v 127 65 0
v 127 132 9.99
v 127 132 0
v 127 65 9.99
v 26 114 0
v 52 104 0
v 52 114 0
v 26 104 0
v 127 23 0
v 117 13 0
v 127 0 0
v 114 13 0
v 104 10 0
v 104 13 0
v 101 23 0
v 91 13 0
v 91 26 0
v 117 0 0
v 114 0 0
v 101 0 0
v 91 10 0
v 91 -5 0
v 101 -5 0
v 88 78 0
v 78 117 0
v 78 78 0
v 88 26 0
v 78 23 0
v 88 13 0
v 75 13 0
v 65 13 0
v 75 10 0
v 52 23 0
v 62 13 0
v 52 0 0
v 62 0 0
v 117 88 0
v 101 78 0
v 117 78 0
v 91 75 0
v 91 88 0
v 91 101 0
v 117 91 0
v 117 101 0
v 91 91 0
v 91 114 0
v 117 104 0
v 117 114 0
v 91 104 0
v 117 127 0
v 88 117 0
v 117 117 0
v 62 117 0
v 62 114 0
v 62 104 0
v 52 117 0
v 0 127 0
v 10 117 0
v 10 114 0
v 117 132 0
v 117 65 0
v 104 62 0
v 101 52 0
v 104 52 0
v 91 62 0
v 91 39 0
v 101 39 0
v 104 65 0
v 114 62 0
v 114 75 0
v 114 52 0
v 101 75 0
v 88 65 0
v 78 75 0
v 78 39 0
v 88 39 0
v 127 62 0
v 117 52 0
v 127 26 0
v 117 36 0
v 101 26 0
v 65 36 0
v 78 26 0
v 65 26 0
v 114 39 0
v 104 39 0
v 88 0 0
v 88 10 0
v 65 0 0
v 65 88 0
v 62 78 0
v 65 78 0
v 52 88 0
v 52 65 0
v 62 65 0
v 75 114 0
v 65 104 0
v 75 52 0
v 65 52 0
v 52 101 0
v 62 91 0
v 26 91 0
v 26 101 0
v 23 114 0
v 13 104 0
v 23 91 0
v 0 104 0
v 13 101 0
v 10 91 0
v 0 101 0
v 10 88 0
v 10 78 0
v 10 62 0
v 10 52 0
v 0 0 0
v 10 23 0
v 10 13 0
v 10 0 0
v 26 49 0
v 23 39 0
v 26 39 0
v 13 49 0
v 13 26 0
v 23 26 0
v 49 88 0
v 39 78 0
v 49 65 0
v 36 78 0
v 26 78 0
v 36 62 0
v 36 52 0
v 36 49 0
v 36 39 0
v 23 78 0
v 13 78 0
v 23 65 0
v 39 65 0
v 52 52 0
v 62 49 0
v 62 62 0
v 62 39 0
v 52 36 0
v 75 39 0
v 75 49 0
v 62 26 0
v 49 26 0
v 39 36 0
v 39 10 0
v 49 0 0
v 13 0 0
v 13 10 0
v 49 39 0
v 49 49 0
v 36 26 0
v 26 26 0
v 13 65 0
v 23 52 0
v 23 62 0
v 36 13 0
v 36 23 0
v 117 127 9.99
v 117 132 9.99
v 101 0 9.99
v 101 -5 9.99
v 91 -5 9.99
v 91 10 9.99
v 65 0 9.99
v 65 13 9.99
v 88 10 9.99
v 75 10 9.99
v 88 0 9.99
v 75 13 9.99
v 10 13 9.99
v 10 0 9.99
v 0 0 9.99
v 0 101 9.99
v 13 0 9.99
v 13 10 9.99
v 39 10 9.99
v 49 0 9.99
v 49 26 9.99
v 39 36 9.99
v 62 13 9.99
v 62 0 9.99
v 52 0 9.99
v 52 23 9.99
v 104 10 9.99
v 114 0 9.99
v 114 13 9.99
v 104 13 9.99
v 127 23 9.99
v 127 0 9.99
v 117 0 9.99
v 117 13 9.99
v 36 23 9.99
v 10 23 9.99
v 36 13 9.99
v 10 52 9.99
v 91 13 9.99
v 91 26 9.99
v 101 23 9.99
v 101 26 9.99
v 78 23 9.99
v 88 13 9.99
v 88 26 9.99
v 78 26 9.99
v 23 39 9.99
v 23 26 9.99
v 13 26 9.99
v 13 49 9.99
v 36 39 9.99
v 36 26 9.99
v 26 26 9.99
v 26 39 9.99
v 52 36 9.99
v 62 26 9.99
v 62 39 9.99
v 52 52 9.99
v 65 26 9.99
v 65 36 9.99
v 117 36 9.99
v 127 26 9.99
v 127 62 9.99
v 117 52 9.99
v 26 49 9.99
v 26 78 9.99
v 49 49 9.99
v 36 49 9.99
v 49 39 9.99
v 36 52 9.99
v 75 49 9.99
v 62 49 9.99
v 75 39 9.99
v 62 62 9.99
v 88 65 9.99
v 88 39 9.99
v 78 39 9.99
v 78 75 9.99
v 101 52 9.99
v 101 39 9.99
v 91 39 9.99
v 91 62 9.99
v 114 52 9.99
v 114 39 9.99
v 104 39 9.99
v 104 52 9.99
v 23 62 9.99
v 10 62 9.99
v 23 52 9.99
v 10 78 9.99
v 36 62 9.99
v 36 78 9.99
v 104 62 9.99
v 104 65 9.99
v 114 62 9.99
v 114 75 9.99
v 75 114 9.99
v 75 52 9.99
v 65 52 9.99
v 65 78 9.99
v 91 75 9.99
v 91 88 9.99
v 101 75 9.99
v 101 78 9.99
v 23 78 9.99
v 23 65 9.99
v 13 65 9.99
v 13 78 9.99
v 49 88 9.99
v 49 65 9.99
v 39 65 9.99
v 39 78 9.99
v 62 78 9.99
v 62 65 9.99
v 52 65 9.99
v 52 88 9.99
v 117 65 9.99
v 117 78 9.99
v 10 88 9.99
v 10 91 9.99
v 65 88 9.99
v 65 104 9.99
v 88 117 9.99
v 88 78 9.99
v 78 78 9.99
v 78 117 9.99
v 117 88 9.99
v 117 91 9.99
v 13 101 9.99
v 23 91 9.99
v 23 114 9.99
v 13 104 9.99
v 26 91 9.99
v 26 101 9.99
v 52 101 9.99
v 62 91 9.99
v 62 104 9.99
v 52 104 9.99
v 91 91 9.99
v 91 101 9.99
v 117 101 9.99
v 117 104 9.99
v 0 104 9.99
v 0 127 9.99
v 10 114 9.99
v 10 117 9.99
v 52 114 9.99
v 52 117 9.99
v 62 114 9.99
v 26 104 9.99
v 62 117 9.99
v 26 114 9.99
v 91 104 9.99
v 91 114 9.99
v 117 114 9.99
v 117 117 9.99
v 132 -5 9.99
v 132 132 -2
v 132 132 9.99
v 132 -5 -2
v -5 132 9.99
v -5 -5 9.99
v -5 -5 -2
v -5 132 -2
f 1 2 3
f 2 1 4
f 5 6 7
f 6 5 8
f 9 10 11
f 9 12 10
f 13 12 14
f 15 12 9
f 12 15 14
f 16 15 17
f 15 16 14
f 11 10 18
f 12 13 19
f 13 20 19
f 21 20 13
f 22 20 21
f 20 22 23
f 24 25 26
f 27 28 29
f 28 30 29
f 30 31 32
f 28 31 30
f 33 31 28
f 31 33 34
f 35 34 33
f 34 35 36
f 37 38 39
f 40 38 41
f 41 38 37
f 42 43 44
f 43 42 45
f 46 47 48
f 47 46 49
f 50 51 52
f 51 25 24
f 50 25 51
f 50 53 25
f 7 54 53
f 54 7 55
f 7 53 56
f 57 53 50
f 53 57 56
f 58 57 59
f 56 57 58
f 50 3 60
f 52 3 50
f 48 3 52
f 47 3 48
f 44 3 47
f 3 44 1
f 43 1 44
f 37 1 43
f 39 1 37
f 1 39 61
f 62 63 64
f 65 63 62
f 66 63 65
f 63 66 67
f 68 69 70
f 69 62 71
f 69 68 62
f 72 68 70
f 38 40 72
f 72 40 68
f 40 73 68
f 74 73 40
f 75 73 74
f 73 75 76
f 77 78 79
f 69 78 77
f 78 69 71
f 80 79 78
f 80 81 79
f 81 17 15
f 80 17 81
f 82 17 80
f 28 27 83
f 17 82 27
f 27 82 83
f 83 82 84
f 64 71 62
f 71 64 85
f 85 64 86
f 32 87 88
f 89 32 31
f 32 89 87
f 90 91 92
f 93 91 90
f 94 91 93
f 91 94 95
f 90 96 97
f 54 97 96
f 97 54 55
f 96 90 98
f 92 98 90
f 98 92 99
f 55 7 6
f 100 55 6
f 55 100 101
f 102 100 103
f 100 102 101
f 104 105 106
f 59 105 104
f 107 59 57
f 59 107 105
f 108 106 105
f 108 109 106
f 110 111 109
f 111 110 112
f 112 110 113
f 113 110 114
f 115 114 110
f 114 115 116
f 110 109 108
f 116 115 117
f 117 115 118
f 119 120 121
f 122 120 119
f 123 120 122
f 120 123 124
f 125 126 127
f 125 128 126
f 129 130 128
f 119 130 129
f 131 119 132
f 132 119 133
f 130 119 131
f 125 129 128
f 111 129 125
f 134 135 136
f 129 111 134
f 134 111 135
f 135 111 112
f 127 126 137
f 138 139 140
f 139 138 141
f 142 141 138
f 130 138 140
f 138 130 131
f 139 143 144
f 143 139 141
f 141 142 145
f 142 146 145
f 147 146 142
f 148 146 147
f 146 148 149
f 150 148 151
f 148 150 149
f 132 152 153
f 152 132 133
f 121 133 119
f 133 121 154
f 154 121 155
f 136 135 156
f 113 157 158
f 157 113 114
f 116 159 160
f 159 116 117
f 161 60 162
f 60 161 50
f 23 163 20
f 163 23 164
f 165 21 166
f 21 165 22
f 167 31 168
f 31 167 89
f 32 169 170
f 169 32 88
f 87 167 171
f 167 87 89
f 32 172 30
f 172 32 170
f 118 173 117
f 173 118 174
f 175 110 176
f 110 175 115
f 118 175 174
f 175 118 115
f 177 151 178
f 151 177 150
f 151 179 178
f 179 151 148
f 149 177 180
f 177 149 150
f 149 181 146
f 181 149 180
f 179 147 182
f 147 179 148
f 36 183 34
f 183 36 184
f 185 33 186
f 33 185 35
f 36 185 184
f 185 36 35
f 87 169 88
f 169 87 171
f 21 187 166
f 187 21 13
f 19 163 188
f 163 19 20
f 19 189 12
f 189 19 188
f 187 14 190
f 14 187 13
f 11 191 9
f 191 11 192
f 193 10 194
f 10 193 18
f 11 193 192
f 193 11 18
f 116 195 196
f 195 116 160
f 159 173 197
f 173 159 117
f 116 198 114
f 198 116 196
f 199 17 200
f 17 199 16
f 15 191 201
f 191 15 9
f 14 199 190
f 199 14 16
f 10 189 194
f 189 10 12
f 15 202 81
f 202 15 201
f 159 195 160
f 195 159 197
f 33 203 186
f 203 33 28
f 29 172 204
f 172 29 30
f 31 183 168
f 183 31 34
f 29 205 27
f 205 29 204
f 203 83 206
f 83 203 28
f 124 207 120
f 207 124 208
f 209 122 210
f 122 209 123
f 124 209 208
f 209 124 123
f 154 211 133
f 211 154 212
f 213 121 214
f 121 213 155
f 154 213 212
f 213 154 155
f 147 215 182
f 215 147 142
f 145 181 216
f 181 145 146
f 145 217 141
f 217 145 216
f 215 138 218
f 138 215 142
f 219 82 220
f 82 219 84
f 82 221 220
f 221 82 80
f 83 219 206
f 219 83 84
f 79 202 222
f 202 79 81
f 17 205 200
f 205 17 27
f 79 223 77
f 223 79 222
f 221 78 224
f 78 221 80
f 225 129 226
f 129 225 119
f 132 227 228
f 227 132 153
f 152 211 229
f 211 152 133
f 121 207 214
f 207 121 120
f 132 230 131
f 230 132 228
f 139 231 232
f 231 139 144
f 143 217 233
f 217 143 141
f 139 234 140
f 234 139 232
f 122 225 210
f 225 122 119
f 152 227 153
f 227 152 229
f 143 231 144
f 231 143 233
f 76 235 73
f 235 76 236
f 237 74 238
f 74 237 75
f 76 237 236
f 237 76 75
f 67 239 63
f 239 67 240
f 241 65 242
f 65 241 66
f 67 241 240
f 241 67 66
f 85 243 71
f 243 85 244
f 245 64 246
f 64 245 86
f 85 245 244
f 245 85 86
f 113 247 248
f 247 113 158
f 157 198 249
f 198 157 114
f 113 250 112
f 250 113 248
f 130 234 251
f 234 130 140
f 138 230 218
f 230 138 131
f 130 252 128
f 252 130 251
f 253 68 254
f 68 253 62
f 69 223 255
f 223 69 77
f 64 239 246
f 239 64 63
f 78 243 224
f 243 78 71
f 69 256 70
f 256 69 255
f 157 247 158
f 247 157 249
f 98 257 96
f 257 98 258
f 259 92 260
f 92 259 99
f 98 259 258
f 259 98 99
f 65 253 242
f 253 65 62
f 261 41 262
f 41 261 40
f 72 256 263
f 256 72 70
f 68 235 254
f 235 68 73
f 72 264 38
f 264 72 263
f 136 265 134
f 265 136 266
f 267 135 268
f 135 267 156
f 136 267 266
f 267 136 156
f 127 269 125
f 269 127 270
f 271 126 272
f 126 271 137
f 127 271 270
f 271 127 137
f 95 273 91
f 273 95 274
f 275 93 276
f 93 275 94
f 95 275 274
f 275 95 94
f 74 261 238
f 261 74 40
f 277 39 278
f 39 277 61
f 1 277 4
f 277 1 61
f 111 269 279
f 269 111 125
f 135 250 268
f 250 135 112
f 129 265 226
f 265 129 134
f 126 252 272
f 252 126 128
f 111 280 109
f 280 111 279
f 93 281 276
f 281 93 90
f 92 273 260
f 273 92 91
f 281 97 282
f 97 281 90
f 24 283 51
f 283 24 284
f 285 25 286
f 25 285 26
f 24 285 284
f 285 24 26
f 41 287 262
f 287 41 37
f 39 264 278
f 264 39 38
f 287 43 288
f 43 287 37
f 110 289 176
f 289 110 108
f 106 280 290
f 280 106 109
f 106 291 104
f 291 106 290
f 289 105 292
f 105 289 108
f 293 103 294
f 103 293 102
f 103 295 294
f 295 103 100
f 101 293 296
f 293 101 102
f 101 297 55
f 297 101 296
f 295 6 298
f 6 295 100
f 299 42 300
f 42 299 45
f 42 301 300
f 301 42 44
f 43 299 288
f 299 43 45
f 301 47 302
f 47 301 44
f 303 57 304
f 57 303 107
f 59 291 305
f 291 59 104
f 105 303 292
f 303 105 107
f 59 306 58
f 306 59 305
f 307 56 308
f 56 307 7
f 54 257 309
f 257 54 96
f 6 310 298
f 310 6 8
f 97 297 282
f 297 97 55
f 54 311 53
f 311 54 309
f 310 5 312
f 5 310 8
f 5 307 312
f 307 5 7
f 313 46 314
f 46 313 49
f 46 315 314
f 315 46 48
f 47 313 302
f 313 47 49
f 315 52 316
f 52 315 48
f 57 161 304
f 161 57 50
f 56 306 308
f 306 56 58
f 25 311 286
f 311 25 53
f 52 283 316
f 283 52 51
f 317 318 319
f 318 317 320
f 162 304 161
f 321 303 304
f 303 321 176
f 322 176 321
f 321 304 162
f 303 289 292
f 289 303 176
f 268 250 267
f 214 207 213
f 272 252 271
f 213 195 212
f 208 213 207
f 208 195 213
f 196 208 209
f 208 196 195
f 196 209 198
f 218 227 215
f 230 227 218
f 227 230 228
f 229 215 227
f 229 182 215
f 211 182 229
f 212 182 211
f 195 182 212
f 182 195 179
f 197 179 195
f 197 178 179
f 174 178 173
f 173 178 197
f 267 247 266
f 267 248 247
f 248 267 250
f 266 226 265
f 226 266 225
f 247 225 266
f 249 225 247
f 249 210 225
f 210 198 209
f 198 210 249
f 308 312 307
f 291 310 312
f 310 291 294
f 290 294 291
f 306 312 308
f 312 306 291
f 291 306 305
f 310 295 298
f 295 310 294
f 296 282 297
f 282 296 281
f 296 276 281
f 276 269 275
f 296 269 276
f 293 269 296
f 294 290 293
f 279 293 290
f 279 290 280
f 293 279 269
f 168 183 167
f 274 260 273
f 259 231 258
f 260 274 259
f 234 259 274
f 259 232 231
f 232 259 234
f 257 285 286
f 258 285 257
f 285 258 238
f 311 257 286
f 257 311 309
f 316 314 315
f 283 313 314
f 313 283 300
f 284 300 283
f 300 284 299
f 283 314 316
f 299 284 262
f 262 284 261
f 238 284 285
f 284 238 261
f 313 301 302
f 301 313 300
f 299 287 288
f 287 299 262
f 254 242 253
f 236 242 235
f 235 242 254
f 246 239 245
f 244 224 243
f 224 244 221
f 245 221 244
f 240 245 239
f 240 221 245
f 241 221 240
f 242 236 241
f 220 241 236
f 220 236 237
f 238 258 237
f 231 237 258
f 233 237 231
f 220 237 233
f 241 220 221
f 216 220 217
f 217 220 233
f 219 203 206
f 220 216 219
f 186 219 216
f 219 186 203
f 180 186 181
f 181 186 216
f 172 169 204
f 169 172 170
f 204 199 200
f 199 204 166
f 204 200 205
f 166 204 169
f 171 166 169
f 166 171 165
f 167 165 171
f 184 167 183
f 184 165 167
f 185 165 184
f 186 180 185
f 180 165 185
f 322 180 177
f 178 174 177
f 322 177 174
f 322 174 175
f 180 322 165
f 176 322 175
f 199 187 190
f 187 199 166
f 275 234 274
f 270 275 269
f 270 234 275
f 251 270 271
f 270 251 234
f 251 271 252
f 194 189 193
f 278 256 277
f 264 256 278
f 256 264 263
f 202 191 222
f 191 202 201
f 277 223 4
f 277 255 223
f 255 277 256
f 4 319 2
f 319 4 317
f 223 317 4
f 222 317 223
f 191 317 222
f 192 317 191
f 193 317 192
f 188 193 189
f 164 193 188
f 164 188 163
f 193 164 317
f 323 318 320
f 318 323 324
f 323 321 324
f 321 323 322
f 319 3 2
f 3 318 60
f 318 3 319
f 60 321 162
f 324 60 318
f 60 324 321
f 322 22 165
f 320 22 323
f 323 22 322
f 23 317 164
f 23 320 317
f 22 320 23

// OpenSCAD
//Algorithms learned from the excellent explanations at http://weblog.jamisbuck.org/2011/2/7/maze-generation-algorithm-recap.html

//preview[view:south, tilt:top]

//See instructions if increasing this doesn't work (this shouldn't be a problem below 25)
maze_width=10;//[4:50]


//See instructions if increasing this doesn't work
maze_height=10;//[4:50]


//See instructions for information on maze types
maze_type = "Sidewinder";//[Sidewinder,Binary Tree,Unicursal Sidewinder,Unicursal Binary Tree]

//Lower numbers cause more vertical paths. Higher numbers cause more horizontal paths.
direction_bias = 5;//[1:9]

//How wide should each path be, in mm
width_of_paths=10;//[1:50]


//Height, in mm, of the walls
wall_height=10;//[5:50]


//Thickness of inside walls, in mm
inside_wall_thickness=3;//[1:10]


//Thickness of outside wall, in mm
outside_wall_thickness=5;//[1:20]

//Allows entry into the maze from the side
include_an_entrance=1;//[0:No,1:Yes]

//Thickness of base below maze, in mm
base_thickness=2;//[1:10]


//See instructions for information on this, otherwise, leave at 0
random_seed = 0;

/* [Hidden] */
bias = (direction_bias < 5)? 5/direction_bias : .2*(10-direction_bias);

seed = (random_seed == 0)?rands(0,1000000,1)[0]:random_seed;
width=unicursalchecker()?(maze_width%2==0)?maze_width/2:(maze_width+1)/2:maze_width;
height=unicursalchecker()?(maze_height%2==0)?maze_height/2:(maze_height+1)/2:maze_height;
path_width=unicursalchecker()?(width_of_paths*2)+inside_wall_thickness:width_of_paths;

    
    difference(){
      mazeBase();//Correctly sized cube
      if(include_an_entrance == 1)  
        mazeEntrance();//More cubes
   if(maze_type == "Sidewinder" || maze_type == "Unicursal Sidewinder")      
        SideWinder();
   if(maze_type == "Binary Tree"||maze_type == "Unicursal Binary Tree")
       BinaryTree();
     }
    if(maze_type == "Unicursal Sidewinder") SideWinder(unicursal = true);//Adds mid-paths for unicursal mazes
    if(maze_type == "Unicursal Binary Tree") BinaryTree(unicursal = true);
function unicursalchecker()=(maze_type == "Unicursal Sidewinder" || maze_type == "Unicursal Binary Tree");
    
module mazeEntrance(){
    
        translate([(path_width*(width-1))+(inside_wall_thickness*(width-1)),(path_width*height)+(inside_wall_thickness*(height-1))-.1,0])cube([path_width,outside_wall_thickness+.2,wall_height+.1]);//Top right entrance
    if(!unicursalchecker()){//Other entrance
        nums = (width%2==0)?(width%4==0)?width/2:(width+2)/2:((width-1)%4==0)?(width+1)/2:(width-1)/2;
        pos=floor(rands(((width-nums)/2),width-((width-nums)/2),1,seed)[0]);
        translate([(path_width*pos)+(inside_wall_thickness*pos),-(outside_wall_thickness+.1),0])cube([path_width,outside_wall_thickness+.2,wall_height+.1]);
    }
}  
    
module mazeBase(){
    
    translate([-outside_wall_thickness,-outside_wall_thickness,-base_thickness])cube([(2*outside_wall_thickness)+(width*path_width)+((width-1)*inside_wall_thickness),(2*outside_wall_thickness)+(height*path_width)+((height-1)*inside_wall_thickness),base_thickness+wall_height-.01]);    
    }
    
module BinaryTree(unicursal=false){
rndtmp=biasfixer(rndtmpgenbias());//generates array of rands

rndflr = rndflrer(rndtmp);//makes array 0 or 1
    
rndrow = rndrower(rndflr);//creates correctly size row
    
mazetopremoved = remove_top_row(rndrow);
//Required for binary tree    
mazeinfo = remove_right_row(mazetopremoved);

    //Generates parts
for(h=[0:height-1])for(w=[0:width-1])
    translate([(path_width+inside_wall_thickness)*w,(path_width+inside_wall_thickness)*h,0])BinaryTreeblock(mazeinfo[h][w]);

function rndtmpgen()= rands(0,2,(width*height),(seed));

function rndtmpgenbias() = rands(0,(1/bias)+1,(width*height),(seed));

function biasfixer(matrix)=[for(i=matrix)(i>1)?1:i];
    
function rndflrer(rndtmp)=[for(i=rndtmp)floor(i)];
    
function rndrower(rndflr)=[for(h=[0:height-1])[for(w=[0:width-1]) rndflr[h * width + w]]];
    
function remove_top_row(mazeinfo)=[for (h=[0:height-1])(h==height-1)?[for (w=[0:width-1])1]:mazeinfo[h]];
    
function remove_right_row(mazeinfo)=[for(h=[0:height-1])[for (w = [0:width-1]) (w==width-1)?(h==height-1)?2:0:mazeinfo[h][w]]];
    
    module BinaryTreeblock(type){
        if(unicursal == false){
        if(type == 0)
            cube([path_width,path_width+inside_wall_thickness+.1,wall_height+.1]);
        if(type == 1)
            cube([path_width+inside_wall_thickness+.1,path_width,wall_height+.1]);
        if(type == 2)
            cube([path_width,path_width,wall_height+.1]);
    }
        if(unicursal == true){//midpaths
            if(type == 1)
                translate([width_of_paths,width_of_paths,0])cube([path_width+inside_wall_thickness,inside_wall_thickness,wall_height+.1]);
            if(type == 0)
                translate([width_of_paths,width_of_paths,0])cube([inside_wall_thickness,path_width+inside_wall_thickness,wall_height + .1]);
            if(type == 2)
                translate([width_of_paths,width_of_paths,0])cube([inside_wall_thickness,width_of_paths+inside_wall_thickness+outside_wall_thickness,wall_height + .1]);
            }
}}
module SideWinder(unicursal=false){
    
rndtmp=biasfixer(rndtmpgenbias());//rnd values

rndflr = rndflrer(rndtmp);//makes values an int[][]
    
rndrow = rndrower(rndflr);//creates rows

rndrowfixed=rndmazefixer(rndrow);//Pre-processing for algorithm

rndsums=rndsummer(rndrowfixed);//How many 0's are in a row

runranded=runrander(rndsums);//Where should it carve up

upcarves = upcarvesgen(runranded);//Puts upcarves where they are needed

mazeinfo_almost = upcarves+rndrowfixed;//combines group and upcarves data
    
mazeinfo=remove_top_row(mazeinfo_almost);//top row must be removed


    
    for(h=[0:height-1])for(w=[0:width-1])
    translate([(path_width+inside_wall_thickness)*w,(path_width+inside_wall_thickness)*h,0])SideWinderblock(mazeinfo[h][w]);//generates blocks

function runrander(rndsums)=[for(h=[0:height-1]) [for(w=[0:width-1])(rndsums[h][w]==0)?0:floor(rands(0,rndsums[h][w],1,rndtmpgen()[h*width + w])[0]+1)]];
    
function remove_top_row(mazeinfo)=[for (h=[0:height-1])(h==height-1)?[for (w=[0:width-1])(w==width-1)?4:0]:mazeinfo[h]];

function upcarvesgen(runranded)=[for(h=[0:height-1])[for(w=[0:width-1])upcarveshelper(runranded[h],w,1)]];
    
function upcarveshelper(runranded,w,iter)=(runranded[w]==0)?upcarveshelper(runranded,w+1,iter+1):(runranded[w] == iter)?2:0;

function rndmazefixer(rndrow)=[for(h=[0:height-1])rndrowfixer(rndrow[h])];
    
function rndrowfixer(row)=[for (w = [0:width-1]) (w==width-1)?1:row[w]];

function rndtmpgen()= rands(0,2,(width*height),(seed));

function rndtmpgenbias() = rands(0,bias+1,(width*height),(seed));

function biasfixer(matrix)=[for(i=matrix)(i>1)?1:i];

function rndflrer(rndtmp)=[for(i=rndtmp)floor(i)];
    
function rndrower(rndflr)=[for(h=[0:height-1])[for(w=[0:width-1]) rndflr[h * width + w]]];
    
function rndsummer(rndrow)=[for(h=rndrow)rndsumrow(h)];
    
function rndsumrow(h,i=0,wi=0)=(i==0)?
        [for (w=[0:len(h)-1]) (h[w]==0)?
            0:
            rndsumrow(h,i=1,wi=w)]:
                (wi == 0)?
                    i:
                    (h[wi-1]==0)?   rndsumrow(h,i=i+1,wi=wi-1):
        i;
        
 module SideWinderblock(type){
            if(unicursal == false){//generate blocks
    if(type == 0){
        cube([path_width+inside_wall_thickness+.1,path_width,wall_height + .1]);       
    }
    if(type == 1||type == 4){
        cube([path_width,path_width,wall_height + .1]);
    }
    if(type == 2){
        SideWinderblock(0);
        SideWinderblock(3);
    }
    if(type == 3){
        
        cube([path_width,path_width+inside_wall_thickness+.1,wall_height + .1]);
    }}
    if(unicursal == true){//generate paths in the middle
        if(type == 0)translate([width_of_paths,width_of_paths,0])cube([path_width+inside_wall_thickness,inside_wall_thickness,wall_height+.1]);
            
        if(type == 1)
            translate([width_of_paths,width_of_paths,0])cube([inside_wall_thickness,inside_wall_thickness,wall_height+.1]);
        
        if(type == 2){
            SideWinderblock(0);
            SideWinderblock(3);
        }
        if(type == 3)
            translate([width_of_paths,width_of_paths,0])cube([inside_wall_thickness,path_width+inside_wall_thickness,wall_height+.1]);
        if(type == 4)
            translate([width_of_paths,width_of_paths,0])cube([inside_wall_thickness,width_of_paths+inside_wall_thickness+outside_wall_thickness,wall_height+.1]);
    }
    
}

}
       
